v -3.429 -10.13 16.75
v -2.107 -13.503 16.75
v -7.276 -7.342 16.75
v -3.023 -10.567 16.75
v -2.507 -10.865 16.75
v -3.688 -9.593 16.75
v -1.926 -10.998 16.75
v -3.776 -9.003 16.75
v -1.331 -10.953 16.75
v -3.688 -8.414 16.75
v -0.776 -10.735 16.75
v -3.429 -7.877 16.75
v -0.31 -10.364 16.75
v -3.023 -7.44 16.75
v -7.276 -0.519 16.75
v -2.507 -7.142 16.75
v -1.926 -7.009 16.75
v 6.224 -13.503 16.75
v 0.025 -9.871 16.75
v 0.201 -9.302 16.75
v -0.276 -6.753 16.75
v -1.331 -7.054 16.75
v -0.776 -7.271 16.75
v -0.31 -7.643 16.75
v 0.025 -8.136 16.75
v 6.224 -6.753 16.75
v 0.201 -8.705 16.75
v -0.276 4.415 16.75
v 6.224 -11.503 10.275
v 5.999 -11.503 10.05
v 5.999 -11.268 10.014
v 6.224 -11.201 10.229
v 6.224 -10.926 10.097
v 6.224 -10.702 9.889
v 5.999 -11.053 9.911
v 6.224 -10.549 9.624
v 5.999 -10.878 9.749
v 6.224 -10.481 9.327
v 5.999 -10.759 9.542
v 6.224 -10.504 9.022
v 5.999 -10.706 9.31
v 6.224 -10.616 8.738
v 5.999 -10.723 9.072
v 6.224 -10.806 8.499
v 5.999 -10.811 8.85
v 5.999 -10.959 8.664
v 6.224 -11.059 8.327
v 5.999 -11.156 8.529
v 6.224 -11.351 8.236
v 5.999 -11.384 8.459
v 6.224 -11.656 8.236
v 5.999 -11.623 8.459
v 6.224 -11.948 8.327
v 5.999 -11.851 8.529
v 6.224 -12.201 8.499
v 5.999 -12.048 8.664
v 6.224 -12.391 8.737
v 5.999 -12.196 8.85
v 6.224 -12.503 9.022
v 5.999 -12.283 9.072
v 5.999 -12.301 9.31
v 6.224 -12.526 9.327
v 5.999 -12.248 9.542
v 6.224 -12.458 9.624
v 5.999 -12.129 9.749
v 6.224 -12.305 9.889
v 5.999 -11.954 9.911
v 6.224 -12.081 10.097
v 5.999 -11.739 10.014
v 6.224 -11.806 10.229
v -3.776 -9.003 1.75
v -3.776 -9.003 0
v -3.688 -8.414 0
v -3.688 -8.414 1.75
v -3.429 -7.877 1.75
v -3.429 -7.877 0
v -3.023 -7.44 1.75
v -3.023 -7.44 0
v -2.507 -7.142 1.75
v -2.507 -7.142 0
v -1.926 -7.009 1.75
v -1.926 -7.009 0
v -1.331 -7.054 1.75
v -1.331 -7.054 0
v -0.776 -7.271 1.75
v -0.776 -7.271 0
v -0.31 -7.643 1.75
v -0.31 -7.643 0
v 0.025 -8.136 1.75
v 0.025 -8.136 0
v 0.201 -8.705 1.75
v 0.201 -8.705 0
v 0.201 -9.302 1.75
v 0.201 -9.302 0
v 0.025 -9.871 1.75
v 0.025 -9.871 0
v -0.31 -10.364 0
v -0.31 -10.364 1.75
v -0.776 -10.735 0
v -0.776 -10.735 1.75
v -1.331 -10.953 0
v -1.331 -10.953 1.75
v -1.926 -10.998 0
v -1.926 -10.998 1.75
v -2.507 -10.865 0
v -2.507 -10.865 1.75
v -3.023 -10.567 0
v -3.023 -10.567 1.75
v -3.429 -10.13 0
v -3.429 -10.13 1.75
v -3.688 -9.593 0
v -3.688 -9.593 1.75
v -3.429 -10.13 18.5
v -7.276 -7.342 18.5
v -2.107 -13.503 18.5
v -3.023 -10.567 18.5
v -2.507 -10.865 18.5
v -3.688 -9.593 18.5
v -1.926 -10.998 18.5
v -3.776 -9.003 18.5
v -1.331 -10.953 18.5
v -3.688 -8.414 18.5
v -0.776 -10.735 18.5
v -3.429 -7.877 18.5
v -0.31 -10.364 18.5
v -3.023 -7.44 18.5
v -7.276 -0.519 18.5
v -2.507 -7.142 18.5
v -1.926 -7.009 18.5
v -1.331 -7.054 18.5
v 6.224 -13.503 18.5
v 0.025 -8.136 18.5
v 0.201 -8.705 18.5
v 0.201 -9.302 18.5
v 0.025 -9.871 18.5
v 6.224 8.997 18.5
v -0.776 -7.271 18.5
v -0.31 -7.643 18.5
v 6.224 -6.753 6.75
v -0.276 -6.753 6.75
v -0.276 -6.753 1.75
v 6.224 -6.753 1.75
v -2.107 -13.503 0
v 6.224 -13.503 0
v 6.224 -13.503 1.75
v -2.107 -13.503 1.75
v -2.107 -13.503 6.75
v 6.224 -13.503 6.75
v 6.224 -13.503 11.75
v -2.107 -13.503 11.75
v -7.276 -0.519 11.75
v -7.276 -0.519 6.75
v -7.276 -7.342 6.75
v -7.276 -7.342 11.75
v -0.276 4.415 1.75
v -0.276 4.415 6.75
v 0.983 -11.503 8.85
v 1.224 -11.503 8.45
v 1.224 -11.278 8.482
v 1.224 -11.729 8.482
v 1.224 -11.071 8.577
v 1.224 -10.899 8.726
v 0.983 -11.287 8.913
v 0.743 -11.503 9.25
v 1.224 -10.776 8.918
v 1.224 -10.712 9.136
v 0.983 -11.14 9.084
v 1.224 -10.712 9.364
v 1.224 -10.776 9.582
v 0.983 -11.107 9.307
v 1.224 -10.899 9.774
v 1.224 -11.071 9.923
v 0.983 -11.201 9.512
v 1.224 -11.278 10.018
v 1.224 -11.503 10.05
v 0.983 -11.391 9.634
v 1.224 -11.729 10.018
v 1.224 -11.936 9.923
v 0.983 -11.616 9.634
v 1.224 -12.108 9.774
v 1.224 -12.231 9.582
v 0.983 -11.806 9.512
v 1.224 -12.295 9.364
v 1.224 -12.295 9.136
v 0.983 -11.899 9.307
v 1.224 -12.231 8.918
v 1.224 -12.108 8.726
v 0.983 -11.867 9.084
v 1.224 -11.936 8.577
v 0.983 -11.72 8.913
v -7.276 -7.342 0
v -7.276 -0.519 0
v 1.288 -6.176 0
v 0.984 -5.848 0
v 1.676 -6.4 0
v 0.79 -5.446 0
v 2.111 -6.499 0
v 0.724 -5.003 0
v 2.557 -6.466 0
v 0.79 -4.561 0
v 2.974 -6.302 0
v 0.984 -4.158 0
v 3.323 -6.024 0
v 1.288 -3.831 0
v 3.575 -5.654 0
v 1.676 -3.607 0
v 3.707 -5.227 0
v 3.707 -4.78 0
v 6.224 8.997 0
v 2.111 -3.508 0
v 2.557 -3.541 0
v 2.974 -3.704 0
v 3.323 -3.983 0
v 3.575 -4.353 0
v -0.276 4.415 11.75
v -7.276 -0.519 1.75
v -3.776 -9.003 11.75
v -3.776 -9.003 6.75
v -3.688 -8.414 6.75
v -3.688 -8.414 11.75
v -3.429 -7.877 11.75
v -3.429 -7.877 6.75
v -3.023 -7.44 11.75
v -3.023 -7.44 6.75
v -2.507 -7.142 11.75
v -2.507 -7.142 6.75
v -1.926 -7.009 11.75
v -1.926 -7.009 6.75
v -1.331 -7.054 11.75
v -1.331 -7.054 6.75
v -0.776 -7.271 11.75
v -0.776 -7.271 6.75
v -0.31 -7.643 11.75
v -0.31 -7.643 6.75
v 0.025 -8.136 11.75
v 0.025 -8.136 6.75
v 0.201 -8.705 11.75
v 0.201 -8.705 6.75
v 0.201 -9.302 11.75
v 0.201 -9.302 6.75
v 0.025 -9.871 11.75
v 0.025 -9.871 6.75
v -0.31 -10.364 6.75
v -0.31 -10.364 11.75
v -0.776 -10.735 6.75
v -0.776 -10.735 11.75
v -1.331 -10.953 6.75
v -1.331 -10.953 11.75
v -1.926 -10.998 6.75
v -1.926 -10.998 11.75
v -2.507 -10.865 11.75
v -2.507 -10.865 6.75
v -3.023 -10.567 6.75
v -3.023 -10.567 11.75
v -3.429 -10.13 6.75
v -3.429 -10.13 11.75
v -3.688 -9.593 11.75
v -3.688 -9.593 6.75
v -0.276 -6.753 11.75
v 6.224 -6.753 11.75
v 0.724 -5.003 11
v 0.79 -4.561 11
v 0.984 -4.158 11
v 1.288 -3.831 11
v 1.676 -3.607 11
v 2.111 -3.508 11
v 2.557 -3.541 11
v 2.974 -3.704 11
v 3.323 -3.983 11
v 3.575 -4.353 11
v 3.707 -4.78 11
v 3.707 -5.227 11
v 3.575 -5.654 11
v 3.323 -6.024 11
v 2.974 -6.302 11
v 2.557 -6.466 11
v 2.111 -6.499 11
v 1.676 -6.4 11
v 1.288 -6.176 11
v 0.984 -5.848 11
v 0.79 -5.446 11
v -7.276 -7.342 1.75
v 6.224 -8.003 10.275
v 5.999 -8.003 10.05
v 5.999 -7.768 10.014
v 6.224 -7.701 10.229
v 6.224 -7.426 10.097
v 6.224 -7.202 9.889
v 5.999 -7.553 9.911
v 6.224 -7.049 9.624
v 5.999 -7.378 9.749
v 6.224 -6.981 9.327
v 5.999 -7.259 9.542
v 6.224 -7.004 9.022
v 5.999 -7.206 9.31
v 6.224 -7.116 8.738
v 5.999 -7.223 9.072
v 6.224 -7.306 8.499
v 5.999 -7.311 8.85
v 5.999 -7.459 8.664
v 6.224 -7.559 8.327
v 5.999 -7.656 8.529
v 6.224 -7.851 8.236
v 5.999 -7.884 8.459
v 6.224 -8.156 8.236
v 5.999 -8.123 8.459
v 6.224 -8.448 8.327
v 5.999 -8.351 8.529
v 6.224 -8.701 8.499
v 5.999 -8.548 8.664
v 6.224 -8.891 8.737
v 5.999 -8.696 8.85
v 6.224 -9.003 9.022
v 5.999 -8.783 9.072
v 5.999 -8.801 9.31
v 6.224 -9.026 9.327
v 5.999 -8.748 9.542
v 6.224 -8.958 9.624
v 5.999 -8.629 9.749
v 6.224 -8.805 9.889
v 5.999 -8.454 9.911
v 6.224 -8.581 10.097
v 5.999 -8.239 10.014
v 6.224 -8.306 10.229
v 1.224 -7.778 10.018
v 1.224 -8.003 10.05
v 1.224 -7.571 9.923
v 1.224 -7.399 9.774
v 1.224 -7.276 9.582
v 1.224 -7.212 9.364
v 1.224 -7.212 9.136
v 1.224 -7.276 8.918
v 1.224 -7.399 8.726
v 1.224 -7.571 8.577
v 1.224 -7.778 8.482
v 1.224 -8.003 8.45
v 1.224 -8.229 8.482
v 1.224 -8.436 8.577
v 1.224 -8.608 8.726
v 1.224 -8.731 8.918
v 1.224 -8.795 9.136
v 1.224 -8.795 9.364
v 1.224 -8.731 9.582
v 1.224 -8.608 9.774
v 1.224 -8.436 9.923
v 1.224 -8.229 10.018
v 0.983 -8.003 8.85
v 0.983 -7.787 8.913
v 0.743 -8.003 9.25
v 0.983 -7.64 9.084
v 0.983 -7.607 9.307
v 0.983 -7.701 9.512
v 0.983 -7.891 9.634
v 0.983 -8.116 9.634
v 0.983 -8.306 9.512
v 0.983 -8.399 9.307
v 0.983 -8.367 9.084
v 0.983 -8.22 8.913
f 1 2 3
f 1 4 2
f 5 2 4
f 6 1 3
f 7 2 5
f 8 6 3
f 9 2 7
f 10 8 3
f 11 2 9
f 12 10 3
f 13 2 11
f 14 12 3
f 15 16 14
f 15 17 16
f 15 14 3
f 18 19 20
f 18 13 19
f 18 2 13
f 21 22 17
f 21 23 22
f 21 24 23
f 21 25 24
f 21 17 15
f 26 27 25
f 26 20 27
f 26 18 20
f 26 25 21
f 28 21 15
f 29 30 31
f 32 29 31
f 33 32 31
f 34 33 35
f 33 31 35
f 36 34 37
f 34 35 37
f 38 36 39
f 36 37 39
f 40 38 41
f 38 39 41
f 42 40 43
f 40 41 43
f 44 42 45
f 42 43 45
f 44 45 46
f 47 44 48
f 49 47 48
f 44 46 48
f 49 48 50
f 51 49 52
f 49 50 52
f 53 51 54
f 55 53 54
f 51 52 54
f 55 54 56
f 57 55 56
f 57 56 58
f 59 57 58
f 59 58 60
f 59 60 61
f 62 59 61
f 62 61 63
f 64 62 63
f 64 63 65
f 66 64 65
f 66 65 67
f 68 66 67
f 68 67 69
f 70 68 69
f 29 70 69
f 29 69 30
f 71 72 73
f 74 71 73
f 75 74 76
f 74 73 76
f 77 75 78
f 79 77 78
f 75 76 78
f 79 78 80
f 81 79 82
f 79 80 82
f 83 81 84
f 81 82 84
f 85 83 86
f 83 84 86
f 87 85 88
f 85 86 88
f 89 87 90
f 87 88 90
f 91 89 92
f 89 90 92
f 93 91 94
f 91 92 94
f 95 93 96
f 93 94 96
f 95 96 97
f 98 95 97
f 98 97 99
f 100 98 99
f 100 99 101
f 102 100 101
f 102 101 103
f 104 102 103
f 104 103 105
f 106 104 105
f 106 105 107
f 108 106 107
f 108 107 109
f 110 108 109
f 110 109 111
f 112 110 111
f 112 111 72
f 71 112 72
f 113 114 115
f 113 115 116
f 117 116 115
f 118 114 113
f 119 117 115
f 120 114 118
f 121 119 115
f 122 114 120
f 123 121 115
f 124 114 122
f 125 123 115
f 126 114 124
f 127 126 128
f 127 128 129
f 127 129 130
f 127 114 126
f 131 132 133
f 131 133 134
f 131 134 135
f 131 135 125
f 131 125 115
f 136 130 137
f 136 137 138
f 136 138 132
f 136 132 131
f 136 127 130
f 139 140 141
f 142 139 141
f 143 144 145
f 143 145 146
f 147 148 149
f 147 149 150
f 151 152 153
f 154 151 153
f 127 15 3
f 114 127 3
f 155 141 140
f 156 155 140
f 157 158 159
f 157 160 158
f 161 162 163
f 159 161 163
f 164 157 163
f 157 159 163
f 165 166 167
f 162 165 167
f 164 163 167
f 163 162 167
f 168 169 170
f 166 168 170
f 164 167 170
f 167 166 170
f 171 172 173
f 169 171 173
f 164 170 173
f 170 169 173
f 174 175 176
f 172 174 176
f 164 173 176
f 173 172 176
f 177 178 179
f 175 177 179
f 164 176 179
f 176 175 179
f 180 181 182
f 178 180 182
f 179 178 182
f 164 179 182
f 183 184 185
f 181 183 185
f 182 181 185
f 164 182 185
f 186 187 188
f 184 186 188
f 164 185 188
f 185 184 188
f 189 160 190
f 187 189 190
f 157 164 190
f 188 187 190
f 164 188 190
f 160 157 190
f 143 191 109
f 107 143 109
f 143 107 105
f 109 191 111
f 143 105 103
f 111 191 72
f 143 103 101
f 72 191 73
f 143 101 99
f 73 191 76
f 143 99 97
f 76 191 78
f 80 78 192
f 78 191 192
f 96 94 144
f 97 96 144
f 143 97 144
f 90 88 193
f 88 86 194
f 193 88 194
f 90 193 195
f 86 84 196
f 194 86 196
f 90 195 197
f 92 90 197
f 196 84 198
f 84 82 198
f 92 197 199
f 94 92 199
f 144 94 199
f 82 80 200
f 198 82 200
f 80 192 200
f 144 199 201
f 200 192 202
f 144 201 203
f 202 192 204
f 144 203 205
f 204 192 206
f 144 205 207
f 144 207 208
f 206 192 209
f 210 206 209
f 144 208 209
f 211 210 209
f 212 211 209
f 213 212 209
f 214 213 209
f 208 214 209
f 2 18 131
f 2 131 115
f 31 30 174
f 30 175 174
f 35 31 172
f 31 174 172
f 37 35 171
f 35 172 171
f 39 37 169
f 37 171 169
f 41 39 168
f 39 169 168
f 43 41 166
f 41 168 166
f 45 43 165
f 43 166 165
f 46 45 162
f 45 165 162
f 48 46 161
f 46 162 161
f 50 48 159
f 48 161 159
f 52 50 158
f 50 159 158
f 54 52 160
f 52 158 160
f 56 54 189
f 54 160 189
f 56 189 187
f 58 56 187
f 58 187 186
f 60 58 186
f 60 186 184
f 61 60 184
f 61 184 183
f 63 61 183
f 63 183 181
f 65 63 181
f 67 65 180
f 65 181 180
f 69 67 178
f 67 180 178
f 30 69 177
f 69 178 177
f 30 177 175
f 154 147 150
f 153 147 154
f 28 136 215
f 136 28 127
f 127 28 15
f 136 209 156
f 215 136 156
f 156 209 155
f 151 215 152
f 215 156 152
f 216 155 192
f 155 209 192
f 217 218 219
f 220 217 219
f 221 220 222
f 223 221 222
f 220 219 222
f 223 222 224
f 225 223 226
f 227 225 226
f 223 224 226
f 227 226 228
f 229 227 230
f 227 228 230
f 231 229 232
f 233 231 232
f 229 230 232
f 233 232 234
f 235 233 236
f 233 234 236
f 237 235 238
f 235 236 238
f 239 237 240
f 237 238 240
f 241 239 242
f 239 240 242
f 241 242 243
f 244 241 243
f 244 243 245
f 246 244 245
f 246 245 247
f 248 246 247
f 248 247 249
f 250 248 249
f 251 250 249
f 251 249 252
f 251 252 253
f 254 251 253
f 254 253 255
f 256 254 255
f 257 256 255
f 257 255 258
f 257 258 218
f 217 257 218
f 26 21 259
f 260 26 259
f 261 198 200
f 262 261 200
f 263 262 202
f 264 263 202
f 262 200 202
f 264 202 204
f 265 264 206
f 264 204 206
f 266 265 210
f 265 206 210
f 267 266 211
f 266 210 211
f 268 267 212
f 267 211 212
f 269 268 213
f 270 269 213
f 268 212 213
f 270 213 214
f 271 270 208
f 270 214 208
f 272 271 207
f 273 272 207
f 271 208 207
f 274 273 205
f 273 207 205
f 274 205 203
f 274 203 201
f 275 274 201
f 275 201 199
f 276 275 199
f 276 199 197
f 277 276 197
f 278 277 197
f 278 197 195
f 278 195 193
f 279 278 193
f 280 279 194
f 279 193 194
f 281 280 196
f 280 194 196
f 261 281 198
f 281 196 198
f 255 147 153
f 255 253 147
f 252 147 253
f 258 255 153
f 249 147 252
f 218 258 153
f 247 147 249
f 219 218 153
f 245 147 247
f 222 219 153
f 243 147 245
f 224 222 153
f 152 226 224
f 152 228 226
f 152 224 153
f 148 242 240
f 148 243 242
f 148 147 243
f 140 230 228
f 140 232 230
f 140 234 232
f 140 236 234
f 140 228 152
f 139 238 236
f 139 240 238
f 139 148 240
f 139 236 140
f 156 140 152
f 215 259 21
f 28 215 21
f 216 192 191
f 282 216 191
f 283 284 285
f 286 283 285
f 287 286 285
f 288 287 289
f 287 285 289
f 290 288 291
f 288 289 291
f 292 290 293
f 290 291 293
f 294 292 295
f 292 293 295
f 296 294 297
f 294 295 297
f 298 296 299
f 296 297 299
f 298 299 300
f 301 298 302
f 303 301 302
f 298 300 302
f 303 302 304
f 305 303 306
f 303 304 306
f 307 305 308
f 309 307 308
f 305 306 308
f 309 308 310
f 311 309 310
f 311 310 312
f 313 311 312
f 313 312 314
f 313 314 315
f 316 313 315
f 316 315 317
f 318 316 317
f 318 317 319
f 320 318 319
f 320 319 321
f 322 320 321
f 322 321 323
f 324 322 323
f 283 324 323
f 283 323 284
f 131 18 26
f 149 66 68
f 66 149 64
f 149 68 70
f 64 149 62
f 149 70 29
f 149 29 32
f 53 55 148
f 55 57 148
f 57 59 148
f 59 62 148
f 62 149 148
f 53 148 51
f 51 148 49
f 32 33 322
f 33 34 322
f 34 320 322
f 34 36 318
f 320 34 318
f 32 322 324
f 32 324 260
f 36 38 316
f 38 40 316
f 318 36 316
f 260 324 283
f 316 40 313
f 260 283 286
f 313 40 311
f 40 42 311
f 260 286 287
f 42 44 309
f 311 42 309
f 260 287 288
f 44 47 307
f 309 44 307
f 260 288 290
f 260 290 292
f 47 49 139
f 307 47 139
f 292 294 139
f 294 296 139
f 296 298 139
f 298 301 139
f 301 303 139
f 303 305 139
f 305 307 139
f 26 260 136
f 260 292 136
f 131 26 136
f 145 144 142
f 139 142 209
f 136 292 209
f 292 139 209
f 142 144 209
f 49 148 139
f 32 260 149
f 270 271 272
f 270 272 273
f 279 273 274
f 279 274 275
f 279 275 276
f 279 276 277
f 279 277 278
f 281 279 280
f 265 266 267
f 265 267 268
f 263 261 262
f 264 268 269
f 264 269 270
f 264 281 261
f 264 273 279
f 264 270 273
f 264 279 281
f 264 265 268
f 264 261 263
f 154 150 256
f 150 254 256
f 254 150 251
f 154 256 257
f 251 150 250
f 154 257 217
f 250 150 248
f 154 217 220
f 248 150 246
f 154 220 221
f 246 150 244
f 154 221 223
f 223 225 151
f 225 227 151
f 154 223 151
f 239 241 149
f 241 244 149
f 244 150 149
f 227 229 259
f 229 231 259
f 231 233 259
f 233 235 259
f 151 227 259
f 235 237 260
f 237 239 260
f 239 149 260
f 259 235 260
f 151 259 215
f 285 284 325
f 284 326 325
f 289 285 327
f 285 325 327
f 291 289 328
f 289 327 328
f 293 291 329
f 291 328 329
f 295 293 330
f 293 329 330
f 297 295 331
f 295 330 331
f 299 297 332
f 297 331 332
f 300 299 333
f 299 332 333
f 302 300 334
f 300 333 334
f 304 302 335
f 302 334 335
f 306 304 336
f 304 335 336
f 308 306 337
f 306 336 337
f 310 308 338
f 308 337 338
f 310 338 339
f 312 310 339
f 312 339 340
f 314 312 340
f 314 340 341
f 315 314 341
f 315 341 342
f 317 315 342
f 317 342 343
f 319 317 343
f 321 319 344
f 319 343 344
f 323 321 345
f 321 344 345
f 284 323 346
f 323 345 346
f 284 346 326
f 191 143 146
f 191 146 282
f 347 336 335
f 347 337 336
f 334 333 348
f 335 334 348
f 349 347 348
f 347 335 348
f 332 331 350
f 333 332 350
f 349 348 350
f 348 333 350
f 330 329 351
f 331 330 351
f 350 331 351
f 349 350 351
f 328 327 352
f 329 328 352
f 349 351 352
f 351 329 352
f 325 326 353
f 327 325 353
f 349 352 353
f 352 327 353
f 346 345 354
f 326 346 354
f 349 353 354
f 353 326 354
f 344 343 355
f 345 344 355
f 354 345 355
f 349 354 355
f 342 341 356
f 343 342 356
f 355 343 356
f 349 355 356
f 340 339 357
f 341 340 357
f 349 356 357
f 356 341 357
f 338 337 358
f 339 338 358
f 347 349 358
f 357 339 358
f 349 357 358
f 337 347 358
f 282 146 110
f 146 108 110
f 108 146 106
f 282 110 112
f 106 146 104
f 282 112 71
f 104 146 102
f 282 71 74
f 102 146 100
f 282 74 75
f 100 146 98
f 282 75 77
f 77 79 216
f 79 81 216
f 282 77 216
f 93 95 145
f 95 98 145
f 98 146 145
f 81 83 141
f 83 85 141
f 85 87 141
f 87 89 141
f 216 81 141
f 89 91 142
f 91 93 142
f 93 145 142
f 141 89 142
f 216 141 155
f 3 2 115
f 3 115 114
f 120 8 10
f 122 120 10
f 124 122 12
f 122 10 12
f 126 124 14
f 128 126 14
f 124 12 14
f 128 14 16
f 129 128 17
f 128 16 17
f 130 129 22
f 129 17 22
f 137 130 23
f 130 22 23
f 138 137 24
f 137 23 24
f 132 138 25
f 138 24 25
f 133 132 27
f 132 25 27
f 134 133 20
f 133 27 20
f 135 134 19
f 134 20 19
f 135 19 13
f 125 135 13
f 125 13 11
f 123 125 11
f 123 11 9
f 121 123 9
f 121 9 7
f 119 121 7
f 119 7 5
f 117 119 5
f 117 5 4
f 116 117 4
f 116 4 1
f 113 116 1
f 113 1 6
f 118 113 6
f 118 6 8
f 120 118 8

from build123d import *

# Parameters (mm, degrees)
BOSS_EXTRUDE1_DEPTH             = 18.5
SKETCH2_R                       = 2
CUT_EXTRUDE1_DEPTH              = 19.5
SKETCH2_3_R                     = 1.5
CUT_EXTRUDE2_DEPTH              = 11
CUT_EXTRUDE3_DEPTH              = 19.5
CUT_EXTRUDE4_DEPTH              = 19.5
SKETCH7_W                       = 5
SKETCH7_H                       = 6.75
CUT_EXTRUDE5_DEPTH              = 14.5
M2X0_4_TAPPED_HOLE1_D           = 1.6
M2X0_4_TAPPED_HOLE1_DEPTH       = 5
M2X0_4_TAPPED_HOLE1_CSINK_D     = 2.05
M2X0_4_TAPPED_HOLE1_CSINK_ANGLE = 90
M2X0_4_TAPPED_HOLE1_TIP         = 0.480688495
SKETCH11_W                      = 7
SKETCH11_H                      = 5
CUT_EXTRUDE6_DEPTH              = 16.75


with BuildPart() as part:
    # Sketch1 → Boss-Extrude1 (new body)
    with BuildSketch(Plane.XY):
        Polygon((-7.276445285, -10.518598852), (2.223554715, -16.00342641), (6.223554715, -16.00342641), (6.223554715, 8.99657359), (-7.276445285, -0.518598852), align=None)
    extrude(amount=BOSS_EXTRUDE1_DEPTH)

    # Sketch2 → Cut-Extrude1 (cut, through all)
    with BuildSketch(Plane(origin=(0, 0, 0), x_dir=(-1, 0, 0), z_dir=(0, 0, -1))):
        with Locations((1.776445285, -9.00342641)):
            Circle(SKETCH2_R)
    extrude(amount=-CUT_EXTRUDE1_DEPTH, mode=Mode.SUBTRACT)

    # Sketch2<3> → Cut-Extrude2 (cut)
    with BuildSketch(Plane(origin=(0, 0, 0), x_dir=(-1, 0, 0), z_dir=(0, 0, -1))):
        with Locations((-2.223554715, -5.00342641)):
            Circle(SKETCH2_3_R)
    extrude(amount=-CUT_EXTRUDE2_DEPTH, mode=Mode.SUBTRACT)

    # Sketch5 → Cut-Extrude3 (cut, through all)
    with BuildSketch(Plane(origin=(0, 0, 0), x_dir=(-1, 0, 0), z_dir=(0, 0, -1))):
        Polygon((-6.223554715, -13.50342641), (2.106572304, -13.50342641), (-2.223554715, -16.00342641), (-6.223554715, -16.00342641), align=None)
    extrude(amount=-CUT_EXTRUDE3_DEPTH, mode=Mode.SUBTRACT)

    # Sketch6 → Cut-Extrude4 (cut, through all)
    with BuildSketch(Plane(origin=(0, 0, 0), x_dir=(-1, 0, 0), z_dir=(0, 0, -1))):
        Polygon((2.106572304, -13.50342641), (7.276445285, -7.342211711), (7.276445285, -10.518598852), align=None)
    extrude(amount=-CUT_EXTRUDE4_DEPTH, mode=Mode.SUBTRACT)

    # Sketch7 → Cut-Extrude5 (cut, through all)
    with BuildSketch(Plane(origin=(6.223554715, 0, 0), x_dir=(0, 0, -1), z_dir=(1, 0, 0))):
        with Locations((-14.25, -10.12842641)):
            Rectangle(SKETCH7_W, SKETCH7_H)
        with Locations((-4.25, -10.12842641)):
            Rectangle(SKETCH7_W, SKETCH7_H)
    extrude(amount=-CUT_EXTRUDE5_DEPTH, mode=Mode.SUBTRACT)

    # M2x0.4 Tapped Hole1
    with Locations(Plane(origin=(6.223554715, 0, 0), x_dir=(0, 0, -1), z_dir=(1, 0, 0))):
        with Locations((-9.25, -8.00342641), (-9.25, -11.50342641)):
            CounterSinkHole(M2X0_4_TAPPED_HOLE1_D / 2, M2X0_4_TAPPED_HOLE1_CSINK_D / 2, depth=M2X0_4_TAPPED_HOLE1_DEPTH, counter_sink_angle=M2X0_4_TAPPED_HOLE1_CSINK_ANGLE)
            with Locations((0, 0, -(M2X0_4_TAPPED_HOLE1_DEPTH + M2X0_4_TAPPED_HOLE1_TIP / 2))):  # 118° drill point
                Cone(0, M2X0_4_TAPPED_HOLE1_D / 2, M2X0_4_TAPPED_HOLE1_TIP, mode=Mode.SUBTRACT)

    # Sketch11 → Cut-Extrude6 (cut, through all)
    with BuildSketch(Plane.XZ.offset(6.75342641)):
        with Locations((-3.776445285, 14.25)):
            Rectangle(SKETCH11_W, SKETCH11_H)
        with Locations((-3.776445285, 4.25)):
            Rectangle(SKETCH11_W, SKETCH11_H)
    extrude(amount=-CUT_EXTRUDE6_DEPTH, mode=Mode.SUBTRACT)


solid = part.part
